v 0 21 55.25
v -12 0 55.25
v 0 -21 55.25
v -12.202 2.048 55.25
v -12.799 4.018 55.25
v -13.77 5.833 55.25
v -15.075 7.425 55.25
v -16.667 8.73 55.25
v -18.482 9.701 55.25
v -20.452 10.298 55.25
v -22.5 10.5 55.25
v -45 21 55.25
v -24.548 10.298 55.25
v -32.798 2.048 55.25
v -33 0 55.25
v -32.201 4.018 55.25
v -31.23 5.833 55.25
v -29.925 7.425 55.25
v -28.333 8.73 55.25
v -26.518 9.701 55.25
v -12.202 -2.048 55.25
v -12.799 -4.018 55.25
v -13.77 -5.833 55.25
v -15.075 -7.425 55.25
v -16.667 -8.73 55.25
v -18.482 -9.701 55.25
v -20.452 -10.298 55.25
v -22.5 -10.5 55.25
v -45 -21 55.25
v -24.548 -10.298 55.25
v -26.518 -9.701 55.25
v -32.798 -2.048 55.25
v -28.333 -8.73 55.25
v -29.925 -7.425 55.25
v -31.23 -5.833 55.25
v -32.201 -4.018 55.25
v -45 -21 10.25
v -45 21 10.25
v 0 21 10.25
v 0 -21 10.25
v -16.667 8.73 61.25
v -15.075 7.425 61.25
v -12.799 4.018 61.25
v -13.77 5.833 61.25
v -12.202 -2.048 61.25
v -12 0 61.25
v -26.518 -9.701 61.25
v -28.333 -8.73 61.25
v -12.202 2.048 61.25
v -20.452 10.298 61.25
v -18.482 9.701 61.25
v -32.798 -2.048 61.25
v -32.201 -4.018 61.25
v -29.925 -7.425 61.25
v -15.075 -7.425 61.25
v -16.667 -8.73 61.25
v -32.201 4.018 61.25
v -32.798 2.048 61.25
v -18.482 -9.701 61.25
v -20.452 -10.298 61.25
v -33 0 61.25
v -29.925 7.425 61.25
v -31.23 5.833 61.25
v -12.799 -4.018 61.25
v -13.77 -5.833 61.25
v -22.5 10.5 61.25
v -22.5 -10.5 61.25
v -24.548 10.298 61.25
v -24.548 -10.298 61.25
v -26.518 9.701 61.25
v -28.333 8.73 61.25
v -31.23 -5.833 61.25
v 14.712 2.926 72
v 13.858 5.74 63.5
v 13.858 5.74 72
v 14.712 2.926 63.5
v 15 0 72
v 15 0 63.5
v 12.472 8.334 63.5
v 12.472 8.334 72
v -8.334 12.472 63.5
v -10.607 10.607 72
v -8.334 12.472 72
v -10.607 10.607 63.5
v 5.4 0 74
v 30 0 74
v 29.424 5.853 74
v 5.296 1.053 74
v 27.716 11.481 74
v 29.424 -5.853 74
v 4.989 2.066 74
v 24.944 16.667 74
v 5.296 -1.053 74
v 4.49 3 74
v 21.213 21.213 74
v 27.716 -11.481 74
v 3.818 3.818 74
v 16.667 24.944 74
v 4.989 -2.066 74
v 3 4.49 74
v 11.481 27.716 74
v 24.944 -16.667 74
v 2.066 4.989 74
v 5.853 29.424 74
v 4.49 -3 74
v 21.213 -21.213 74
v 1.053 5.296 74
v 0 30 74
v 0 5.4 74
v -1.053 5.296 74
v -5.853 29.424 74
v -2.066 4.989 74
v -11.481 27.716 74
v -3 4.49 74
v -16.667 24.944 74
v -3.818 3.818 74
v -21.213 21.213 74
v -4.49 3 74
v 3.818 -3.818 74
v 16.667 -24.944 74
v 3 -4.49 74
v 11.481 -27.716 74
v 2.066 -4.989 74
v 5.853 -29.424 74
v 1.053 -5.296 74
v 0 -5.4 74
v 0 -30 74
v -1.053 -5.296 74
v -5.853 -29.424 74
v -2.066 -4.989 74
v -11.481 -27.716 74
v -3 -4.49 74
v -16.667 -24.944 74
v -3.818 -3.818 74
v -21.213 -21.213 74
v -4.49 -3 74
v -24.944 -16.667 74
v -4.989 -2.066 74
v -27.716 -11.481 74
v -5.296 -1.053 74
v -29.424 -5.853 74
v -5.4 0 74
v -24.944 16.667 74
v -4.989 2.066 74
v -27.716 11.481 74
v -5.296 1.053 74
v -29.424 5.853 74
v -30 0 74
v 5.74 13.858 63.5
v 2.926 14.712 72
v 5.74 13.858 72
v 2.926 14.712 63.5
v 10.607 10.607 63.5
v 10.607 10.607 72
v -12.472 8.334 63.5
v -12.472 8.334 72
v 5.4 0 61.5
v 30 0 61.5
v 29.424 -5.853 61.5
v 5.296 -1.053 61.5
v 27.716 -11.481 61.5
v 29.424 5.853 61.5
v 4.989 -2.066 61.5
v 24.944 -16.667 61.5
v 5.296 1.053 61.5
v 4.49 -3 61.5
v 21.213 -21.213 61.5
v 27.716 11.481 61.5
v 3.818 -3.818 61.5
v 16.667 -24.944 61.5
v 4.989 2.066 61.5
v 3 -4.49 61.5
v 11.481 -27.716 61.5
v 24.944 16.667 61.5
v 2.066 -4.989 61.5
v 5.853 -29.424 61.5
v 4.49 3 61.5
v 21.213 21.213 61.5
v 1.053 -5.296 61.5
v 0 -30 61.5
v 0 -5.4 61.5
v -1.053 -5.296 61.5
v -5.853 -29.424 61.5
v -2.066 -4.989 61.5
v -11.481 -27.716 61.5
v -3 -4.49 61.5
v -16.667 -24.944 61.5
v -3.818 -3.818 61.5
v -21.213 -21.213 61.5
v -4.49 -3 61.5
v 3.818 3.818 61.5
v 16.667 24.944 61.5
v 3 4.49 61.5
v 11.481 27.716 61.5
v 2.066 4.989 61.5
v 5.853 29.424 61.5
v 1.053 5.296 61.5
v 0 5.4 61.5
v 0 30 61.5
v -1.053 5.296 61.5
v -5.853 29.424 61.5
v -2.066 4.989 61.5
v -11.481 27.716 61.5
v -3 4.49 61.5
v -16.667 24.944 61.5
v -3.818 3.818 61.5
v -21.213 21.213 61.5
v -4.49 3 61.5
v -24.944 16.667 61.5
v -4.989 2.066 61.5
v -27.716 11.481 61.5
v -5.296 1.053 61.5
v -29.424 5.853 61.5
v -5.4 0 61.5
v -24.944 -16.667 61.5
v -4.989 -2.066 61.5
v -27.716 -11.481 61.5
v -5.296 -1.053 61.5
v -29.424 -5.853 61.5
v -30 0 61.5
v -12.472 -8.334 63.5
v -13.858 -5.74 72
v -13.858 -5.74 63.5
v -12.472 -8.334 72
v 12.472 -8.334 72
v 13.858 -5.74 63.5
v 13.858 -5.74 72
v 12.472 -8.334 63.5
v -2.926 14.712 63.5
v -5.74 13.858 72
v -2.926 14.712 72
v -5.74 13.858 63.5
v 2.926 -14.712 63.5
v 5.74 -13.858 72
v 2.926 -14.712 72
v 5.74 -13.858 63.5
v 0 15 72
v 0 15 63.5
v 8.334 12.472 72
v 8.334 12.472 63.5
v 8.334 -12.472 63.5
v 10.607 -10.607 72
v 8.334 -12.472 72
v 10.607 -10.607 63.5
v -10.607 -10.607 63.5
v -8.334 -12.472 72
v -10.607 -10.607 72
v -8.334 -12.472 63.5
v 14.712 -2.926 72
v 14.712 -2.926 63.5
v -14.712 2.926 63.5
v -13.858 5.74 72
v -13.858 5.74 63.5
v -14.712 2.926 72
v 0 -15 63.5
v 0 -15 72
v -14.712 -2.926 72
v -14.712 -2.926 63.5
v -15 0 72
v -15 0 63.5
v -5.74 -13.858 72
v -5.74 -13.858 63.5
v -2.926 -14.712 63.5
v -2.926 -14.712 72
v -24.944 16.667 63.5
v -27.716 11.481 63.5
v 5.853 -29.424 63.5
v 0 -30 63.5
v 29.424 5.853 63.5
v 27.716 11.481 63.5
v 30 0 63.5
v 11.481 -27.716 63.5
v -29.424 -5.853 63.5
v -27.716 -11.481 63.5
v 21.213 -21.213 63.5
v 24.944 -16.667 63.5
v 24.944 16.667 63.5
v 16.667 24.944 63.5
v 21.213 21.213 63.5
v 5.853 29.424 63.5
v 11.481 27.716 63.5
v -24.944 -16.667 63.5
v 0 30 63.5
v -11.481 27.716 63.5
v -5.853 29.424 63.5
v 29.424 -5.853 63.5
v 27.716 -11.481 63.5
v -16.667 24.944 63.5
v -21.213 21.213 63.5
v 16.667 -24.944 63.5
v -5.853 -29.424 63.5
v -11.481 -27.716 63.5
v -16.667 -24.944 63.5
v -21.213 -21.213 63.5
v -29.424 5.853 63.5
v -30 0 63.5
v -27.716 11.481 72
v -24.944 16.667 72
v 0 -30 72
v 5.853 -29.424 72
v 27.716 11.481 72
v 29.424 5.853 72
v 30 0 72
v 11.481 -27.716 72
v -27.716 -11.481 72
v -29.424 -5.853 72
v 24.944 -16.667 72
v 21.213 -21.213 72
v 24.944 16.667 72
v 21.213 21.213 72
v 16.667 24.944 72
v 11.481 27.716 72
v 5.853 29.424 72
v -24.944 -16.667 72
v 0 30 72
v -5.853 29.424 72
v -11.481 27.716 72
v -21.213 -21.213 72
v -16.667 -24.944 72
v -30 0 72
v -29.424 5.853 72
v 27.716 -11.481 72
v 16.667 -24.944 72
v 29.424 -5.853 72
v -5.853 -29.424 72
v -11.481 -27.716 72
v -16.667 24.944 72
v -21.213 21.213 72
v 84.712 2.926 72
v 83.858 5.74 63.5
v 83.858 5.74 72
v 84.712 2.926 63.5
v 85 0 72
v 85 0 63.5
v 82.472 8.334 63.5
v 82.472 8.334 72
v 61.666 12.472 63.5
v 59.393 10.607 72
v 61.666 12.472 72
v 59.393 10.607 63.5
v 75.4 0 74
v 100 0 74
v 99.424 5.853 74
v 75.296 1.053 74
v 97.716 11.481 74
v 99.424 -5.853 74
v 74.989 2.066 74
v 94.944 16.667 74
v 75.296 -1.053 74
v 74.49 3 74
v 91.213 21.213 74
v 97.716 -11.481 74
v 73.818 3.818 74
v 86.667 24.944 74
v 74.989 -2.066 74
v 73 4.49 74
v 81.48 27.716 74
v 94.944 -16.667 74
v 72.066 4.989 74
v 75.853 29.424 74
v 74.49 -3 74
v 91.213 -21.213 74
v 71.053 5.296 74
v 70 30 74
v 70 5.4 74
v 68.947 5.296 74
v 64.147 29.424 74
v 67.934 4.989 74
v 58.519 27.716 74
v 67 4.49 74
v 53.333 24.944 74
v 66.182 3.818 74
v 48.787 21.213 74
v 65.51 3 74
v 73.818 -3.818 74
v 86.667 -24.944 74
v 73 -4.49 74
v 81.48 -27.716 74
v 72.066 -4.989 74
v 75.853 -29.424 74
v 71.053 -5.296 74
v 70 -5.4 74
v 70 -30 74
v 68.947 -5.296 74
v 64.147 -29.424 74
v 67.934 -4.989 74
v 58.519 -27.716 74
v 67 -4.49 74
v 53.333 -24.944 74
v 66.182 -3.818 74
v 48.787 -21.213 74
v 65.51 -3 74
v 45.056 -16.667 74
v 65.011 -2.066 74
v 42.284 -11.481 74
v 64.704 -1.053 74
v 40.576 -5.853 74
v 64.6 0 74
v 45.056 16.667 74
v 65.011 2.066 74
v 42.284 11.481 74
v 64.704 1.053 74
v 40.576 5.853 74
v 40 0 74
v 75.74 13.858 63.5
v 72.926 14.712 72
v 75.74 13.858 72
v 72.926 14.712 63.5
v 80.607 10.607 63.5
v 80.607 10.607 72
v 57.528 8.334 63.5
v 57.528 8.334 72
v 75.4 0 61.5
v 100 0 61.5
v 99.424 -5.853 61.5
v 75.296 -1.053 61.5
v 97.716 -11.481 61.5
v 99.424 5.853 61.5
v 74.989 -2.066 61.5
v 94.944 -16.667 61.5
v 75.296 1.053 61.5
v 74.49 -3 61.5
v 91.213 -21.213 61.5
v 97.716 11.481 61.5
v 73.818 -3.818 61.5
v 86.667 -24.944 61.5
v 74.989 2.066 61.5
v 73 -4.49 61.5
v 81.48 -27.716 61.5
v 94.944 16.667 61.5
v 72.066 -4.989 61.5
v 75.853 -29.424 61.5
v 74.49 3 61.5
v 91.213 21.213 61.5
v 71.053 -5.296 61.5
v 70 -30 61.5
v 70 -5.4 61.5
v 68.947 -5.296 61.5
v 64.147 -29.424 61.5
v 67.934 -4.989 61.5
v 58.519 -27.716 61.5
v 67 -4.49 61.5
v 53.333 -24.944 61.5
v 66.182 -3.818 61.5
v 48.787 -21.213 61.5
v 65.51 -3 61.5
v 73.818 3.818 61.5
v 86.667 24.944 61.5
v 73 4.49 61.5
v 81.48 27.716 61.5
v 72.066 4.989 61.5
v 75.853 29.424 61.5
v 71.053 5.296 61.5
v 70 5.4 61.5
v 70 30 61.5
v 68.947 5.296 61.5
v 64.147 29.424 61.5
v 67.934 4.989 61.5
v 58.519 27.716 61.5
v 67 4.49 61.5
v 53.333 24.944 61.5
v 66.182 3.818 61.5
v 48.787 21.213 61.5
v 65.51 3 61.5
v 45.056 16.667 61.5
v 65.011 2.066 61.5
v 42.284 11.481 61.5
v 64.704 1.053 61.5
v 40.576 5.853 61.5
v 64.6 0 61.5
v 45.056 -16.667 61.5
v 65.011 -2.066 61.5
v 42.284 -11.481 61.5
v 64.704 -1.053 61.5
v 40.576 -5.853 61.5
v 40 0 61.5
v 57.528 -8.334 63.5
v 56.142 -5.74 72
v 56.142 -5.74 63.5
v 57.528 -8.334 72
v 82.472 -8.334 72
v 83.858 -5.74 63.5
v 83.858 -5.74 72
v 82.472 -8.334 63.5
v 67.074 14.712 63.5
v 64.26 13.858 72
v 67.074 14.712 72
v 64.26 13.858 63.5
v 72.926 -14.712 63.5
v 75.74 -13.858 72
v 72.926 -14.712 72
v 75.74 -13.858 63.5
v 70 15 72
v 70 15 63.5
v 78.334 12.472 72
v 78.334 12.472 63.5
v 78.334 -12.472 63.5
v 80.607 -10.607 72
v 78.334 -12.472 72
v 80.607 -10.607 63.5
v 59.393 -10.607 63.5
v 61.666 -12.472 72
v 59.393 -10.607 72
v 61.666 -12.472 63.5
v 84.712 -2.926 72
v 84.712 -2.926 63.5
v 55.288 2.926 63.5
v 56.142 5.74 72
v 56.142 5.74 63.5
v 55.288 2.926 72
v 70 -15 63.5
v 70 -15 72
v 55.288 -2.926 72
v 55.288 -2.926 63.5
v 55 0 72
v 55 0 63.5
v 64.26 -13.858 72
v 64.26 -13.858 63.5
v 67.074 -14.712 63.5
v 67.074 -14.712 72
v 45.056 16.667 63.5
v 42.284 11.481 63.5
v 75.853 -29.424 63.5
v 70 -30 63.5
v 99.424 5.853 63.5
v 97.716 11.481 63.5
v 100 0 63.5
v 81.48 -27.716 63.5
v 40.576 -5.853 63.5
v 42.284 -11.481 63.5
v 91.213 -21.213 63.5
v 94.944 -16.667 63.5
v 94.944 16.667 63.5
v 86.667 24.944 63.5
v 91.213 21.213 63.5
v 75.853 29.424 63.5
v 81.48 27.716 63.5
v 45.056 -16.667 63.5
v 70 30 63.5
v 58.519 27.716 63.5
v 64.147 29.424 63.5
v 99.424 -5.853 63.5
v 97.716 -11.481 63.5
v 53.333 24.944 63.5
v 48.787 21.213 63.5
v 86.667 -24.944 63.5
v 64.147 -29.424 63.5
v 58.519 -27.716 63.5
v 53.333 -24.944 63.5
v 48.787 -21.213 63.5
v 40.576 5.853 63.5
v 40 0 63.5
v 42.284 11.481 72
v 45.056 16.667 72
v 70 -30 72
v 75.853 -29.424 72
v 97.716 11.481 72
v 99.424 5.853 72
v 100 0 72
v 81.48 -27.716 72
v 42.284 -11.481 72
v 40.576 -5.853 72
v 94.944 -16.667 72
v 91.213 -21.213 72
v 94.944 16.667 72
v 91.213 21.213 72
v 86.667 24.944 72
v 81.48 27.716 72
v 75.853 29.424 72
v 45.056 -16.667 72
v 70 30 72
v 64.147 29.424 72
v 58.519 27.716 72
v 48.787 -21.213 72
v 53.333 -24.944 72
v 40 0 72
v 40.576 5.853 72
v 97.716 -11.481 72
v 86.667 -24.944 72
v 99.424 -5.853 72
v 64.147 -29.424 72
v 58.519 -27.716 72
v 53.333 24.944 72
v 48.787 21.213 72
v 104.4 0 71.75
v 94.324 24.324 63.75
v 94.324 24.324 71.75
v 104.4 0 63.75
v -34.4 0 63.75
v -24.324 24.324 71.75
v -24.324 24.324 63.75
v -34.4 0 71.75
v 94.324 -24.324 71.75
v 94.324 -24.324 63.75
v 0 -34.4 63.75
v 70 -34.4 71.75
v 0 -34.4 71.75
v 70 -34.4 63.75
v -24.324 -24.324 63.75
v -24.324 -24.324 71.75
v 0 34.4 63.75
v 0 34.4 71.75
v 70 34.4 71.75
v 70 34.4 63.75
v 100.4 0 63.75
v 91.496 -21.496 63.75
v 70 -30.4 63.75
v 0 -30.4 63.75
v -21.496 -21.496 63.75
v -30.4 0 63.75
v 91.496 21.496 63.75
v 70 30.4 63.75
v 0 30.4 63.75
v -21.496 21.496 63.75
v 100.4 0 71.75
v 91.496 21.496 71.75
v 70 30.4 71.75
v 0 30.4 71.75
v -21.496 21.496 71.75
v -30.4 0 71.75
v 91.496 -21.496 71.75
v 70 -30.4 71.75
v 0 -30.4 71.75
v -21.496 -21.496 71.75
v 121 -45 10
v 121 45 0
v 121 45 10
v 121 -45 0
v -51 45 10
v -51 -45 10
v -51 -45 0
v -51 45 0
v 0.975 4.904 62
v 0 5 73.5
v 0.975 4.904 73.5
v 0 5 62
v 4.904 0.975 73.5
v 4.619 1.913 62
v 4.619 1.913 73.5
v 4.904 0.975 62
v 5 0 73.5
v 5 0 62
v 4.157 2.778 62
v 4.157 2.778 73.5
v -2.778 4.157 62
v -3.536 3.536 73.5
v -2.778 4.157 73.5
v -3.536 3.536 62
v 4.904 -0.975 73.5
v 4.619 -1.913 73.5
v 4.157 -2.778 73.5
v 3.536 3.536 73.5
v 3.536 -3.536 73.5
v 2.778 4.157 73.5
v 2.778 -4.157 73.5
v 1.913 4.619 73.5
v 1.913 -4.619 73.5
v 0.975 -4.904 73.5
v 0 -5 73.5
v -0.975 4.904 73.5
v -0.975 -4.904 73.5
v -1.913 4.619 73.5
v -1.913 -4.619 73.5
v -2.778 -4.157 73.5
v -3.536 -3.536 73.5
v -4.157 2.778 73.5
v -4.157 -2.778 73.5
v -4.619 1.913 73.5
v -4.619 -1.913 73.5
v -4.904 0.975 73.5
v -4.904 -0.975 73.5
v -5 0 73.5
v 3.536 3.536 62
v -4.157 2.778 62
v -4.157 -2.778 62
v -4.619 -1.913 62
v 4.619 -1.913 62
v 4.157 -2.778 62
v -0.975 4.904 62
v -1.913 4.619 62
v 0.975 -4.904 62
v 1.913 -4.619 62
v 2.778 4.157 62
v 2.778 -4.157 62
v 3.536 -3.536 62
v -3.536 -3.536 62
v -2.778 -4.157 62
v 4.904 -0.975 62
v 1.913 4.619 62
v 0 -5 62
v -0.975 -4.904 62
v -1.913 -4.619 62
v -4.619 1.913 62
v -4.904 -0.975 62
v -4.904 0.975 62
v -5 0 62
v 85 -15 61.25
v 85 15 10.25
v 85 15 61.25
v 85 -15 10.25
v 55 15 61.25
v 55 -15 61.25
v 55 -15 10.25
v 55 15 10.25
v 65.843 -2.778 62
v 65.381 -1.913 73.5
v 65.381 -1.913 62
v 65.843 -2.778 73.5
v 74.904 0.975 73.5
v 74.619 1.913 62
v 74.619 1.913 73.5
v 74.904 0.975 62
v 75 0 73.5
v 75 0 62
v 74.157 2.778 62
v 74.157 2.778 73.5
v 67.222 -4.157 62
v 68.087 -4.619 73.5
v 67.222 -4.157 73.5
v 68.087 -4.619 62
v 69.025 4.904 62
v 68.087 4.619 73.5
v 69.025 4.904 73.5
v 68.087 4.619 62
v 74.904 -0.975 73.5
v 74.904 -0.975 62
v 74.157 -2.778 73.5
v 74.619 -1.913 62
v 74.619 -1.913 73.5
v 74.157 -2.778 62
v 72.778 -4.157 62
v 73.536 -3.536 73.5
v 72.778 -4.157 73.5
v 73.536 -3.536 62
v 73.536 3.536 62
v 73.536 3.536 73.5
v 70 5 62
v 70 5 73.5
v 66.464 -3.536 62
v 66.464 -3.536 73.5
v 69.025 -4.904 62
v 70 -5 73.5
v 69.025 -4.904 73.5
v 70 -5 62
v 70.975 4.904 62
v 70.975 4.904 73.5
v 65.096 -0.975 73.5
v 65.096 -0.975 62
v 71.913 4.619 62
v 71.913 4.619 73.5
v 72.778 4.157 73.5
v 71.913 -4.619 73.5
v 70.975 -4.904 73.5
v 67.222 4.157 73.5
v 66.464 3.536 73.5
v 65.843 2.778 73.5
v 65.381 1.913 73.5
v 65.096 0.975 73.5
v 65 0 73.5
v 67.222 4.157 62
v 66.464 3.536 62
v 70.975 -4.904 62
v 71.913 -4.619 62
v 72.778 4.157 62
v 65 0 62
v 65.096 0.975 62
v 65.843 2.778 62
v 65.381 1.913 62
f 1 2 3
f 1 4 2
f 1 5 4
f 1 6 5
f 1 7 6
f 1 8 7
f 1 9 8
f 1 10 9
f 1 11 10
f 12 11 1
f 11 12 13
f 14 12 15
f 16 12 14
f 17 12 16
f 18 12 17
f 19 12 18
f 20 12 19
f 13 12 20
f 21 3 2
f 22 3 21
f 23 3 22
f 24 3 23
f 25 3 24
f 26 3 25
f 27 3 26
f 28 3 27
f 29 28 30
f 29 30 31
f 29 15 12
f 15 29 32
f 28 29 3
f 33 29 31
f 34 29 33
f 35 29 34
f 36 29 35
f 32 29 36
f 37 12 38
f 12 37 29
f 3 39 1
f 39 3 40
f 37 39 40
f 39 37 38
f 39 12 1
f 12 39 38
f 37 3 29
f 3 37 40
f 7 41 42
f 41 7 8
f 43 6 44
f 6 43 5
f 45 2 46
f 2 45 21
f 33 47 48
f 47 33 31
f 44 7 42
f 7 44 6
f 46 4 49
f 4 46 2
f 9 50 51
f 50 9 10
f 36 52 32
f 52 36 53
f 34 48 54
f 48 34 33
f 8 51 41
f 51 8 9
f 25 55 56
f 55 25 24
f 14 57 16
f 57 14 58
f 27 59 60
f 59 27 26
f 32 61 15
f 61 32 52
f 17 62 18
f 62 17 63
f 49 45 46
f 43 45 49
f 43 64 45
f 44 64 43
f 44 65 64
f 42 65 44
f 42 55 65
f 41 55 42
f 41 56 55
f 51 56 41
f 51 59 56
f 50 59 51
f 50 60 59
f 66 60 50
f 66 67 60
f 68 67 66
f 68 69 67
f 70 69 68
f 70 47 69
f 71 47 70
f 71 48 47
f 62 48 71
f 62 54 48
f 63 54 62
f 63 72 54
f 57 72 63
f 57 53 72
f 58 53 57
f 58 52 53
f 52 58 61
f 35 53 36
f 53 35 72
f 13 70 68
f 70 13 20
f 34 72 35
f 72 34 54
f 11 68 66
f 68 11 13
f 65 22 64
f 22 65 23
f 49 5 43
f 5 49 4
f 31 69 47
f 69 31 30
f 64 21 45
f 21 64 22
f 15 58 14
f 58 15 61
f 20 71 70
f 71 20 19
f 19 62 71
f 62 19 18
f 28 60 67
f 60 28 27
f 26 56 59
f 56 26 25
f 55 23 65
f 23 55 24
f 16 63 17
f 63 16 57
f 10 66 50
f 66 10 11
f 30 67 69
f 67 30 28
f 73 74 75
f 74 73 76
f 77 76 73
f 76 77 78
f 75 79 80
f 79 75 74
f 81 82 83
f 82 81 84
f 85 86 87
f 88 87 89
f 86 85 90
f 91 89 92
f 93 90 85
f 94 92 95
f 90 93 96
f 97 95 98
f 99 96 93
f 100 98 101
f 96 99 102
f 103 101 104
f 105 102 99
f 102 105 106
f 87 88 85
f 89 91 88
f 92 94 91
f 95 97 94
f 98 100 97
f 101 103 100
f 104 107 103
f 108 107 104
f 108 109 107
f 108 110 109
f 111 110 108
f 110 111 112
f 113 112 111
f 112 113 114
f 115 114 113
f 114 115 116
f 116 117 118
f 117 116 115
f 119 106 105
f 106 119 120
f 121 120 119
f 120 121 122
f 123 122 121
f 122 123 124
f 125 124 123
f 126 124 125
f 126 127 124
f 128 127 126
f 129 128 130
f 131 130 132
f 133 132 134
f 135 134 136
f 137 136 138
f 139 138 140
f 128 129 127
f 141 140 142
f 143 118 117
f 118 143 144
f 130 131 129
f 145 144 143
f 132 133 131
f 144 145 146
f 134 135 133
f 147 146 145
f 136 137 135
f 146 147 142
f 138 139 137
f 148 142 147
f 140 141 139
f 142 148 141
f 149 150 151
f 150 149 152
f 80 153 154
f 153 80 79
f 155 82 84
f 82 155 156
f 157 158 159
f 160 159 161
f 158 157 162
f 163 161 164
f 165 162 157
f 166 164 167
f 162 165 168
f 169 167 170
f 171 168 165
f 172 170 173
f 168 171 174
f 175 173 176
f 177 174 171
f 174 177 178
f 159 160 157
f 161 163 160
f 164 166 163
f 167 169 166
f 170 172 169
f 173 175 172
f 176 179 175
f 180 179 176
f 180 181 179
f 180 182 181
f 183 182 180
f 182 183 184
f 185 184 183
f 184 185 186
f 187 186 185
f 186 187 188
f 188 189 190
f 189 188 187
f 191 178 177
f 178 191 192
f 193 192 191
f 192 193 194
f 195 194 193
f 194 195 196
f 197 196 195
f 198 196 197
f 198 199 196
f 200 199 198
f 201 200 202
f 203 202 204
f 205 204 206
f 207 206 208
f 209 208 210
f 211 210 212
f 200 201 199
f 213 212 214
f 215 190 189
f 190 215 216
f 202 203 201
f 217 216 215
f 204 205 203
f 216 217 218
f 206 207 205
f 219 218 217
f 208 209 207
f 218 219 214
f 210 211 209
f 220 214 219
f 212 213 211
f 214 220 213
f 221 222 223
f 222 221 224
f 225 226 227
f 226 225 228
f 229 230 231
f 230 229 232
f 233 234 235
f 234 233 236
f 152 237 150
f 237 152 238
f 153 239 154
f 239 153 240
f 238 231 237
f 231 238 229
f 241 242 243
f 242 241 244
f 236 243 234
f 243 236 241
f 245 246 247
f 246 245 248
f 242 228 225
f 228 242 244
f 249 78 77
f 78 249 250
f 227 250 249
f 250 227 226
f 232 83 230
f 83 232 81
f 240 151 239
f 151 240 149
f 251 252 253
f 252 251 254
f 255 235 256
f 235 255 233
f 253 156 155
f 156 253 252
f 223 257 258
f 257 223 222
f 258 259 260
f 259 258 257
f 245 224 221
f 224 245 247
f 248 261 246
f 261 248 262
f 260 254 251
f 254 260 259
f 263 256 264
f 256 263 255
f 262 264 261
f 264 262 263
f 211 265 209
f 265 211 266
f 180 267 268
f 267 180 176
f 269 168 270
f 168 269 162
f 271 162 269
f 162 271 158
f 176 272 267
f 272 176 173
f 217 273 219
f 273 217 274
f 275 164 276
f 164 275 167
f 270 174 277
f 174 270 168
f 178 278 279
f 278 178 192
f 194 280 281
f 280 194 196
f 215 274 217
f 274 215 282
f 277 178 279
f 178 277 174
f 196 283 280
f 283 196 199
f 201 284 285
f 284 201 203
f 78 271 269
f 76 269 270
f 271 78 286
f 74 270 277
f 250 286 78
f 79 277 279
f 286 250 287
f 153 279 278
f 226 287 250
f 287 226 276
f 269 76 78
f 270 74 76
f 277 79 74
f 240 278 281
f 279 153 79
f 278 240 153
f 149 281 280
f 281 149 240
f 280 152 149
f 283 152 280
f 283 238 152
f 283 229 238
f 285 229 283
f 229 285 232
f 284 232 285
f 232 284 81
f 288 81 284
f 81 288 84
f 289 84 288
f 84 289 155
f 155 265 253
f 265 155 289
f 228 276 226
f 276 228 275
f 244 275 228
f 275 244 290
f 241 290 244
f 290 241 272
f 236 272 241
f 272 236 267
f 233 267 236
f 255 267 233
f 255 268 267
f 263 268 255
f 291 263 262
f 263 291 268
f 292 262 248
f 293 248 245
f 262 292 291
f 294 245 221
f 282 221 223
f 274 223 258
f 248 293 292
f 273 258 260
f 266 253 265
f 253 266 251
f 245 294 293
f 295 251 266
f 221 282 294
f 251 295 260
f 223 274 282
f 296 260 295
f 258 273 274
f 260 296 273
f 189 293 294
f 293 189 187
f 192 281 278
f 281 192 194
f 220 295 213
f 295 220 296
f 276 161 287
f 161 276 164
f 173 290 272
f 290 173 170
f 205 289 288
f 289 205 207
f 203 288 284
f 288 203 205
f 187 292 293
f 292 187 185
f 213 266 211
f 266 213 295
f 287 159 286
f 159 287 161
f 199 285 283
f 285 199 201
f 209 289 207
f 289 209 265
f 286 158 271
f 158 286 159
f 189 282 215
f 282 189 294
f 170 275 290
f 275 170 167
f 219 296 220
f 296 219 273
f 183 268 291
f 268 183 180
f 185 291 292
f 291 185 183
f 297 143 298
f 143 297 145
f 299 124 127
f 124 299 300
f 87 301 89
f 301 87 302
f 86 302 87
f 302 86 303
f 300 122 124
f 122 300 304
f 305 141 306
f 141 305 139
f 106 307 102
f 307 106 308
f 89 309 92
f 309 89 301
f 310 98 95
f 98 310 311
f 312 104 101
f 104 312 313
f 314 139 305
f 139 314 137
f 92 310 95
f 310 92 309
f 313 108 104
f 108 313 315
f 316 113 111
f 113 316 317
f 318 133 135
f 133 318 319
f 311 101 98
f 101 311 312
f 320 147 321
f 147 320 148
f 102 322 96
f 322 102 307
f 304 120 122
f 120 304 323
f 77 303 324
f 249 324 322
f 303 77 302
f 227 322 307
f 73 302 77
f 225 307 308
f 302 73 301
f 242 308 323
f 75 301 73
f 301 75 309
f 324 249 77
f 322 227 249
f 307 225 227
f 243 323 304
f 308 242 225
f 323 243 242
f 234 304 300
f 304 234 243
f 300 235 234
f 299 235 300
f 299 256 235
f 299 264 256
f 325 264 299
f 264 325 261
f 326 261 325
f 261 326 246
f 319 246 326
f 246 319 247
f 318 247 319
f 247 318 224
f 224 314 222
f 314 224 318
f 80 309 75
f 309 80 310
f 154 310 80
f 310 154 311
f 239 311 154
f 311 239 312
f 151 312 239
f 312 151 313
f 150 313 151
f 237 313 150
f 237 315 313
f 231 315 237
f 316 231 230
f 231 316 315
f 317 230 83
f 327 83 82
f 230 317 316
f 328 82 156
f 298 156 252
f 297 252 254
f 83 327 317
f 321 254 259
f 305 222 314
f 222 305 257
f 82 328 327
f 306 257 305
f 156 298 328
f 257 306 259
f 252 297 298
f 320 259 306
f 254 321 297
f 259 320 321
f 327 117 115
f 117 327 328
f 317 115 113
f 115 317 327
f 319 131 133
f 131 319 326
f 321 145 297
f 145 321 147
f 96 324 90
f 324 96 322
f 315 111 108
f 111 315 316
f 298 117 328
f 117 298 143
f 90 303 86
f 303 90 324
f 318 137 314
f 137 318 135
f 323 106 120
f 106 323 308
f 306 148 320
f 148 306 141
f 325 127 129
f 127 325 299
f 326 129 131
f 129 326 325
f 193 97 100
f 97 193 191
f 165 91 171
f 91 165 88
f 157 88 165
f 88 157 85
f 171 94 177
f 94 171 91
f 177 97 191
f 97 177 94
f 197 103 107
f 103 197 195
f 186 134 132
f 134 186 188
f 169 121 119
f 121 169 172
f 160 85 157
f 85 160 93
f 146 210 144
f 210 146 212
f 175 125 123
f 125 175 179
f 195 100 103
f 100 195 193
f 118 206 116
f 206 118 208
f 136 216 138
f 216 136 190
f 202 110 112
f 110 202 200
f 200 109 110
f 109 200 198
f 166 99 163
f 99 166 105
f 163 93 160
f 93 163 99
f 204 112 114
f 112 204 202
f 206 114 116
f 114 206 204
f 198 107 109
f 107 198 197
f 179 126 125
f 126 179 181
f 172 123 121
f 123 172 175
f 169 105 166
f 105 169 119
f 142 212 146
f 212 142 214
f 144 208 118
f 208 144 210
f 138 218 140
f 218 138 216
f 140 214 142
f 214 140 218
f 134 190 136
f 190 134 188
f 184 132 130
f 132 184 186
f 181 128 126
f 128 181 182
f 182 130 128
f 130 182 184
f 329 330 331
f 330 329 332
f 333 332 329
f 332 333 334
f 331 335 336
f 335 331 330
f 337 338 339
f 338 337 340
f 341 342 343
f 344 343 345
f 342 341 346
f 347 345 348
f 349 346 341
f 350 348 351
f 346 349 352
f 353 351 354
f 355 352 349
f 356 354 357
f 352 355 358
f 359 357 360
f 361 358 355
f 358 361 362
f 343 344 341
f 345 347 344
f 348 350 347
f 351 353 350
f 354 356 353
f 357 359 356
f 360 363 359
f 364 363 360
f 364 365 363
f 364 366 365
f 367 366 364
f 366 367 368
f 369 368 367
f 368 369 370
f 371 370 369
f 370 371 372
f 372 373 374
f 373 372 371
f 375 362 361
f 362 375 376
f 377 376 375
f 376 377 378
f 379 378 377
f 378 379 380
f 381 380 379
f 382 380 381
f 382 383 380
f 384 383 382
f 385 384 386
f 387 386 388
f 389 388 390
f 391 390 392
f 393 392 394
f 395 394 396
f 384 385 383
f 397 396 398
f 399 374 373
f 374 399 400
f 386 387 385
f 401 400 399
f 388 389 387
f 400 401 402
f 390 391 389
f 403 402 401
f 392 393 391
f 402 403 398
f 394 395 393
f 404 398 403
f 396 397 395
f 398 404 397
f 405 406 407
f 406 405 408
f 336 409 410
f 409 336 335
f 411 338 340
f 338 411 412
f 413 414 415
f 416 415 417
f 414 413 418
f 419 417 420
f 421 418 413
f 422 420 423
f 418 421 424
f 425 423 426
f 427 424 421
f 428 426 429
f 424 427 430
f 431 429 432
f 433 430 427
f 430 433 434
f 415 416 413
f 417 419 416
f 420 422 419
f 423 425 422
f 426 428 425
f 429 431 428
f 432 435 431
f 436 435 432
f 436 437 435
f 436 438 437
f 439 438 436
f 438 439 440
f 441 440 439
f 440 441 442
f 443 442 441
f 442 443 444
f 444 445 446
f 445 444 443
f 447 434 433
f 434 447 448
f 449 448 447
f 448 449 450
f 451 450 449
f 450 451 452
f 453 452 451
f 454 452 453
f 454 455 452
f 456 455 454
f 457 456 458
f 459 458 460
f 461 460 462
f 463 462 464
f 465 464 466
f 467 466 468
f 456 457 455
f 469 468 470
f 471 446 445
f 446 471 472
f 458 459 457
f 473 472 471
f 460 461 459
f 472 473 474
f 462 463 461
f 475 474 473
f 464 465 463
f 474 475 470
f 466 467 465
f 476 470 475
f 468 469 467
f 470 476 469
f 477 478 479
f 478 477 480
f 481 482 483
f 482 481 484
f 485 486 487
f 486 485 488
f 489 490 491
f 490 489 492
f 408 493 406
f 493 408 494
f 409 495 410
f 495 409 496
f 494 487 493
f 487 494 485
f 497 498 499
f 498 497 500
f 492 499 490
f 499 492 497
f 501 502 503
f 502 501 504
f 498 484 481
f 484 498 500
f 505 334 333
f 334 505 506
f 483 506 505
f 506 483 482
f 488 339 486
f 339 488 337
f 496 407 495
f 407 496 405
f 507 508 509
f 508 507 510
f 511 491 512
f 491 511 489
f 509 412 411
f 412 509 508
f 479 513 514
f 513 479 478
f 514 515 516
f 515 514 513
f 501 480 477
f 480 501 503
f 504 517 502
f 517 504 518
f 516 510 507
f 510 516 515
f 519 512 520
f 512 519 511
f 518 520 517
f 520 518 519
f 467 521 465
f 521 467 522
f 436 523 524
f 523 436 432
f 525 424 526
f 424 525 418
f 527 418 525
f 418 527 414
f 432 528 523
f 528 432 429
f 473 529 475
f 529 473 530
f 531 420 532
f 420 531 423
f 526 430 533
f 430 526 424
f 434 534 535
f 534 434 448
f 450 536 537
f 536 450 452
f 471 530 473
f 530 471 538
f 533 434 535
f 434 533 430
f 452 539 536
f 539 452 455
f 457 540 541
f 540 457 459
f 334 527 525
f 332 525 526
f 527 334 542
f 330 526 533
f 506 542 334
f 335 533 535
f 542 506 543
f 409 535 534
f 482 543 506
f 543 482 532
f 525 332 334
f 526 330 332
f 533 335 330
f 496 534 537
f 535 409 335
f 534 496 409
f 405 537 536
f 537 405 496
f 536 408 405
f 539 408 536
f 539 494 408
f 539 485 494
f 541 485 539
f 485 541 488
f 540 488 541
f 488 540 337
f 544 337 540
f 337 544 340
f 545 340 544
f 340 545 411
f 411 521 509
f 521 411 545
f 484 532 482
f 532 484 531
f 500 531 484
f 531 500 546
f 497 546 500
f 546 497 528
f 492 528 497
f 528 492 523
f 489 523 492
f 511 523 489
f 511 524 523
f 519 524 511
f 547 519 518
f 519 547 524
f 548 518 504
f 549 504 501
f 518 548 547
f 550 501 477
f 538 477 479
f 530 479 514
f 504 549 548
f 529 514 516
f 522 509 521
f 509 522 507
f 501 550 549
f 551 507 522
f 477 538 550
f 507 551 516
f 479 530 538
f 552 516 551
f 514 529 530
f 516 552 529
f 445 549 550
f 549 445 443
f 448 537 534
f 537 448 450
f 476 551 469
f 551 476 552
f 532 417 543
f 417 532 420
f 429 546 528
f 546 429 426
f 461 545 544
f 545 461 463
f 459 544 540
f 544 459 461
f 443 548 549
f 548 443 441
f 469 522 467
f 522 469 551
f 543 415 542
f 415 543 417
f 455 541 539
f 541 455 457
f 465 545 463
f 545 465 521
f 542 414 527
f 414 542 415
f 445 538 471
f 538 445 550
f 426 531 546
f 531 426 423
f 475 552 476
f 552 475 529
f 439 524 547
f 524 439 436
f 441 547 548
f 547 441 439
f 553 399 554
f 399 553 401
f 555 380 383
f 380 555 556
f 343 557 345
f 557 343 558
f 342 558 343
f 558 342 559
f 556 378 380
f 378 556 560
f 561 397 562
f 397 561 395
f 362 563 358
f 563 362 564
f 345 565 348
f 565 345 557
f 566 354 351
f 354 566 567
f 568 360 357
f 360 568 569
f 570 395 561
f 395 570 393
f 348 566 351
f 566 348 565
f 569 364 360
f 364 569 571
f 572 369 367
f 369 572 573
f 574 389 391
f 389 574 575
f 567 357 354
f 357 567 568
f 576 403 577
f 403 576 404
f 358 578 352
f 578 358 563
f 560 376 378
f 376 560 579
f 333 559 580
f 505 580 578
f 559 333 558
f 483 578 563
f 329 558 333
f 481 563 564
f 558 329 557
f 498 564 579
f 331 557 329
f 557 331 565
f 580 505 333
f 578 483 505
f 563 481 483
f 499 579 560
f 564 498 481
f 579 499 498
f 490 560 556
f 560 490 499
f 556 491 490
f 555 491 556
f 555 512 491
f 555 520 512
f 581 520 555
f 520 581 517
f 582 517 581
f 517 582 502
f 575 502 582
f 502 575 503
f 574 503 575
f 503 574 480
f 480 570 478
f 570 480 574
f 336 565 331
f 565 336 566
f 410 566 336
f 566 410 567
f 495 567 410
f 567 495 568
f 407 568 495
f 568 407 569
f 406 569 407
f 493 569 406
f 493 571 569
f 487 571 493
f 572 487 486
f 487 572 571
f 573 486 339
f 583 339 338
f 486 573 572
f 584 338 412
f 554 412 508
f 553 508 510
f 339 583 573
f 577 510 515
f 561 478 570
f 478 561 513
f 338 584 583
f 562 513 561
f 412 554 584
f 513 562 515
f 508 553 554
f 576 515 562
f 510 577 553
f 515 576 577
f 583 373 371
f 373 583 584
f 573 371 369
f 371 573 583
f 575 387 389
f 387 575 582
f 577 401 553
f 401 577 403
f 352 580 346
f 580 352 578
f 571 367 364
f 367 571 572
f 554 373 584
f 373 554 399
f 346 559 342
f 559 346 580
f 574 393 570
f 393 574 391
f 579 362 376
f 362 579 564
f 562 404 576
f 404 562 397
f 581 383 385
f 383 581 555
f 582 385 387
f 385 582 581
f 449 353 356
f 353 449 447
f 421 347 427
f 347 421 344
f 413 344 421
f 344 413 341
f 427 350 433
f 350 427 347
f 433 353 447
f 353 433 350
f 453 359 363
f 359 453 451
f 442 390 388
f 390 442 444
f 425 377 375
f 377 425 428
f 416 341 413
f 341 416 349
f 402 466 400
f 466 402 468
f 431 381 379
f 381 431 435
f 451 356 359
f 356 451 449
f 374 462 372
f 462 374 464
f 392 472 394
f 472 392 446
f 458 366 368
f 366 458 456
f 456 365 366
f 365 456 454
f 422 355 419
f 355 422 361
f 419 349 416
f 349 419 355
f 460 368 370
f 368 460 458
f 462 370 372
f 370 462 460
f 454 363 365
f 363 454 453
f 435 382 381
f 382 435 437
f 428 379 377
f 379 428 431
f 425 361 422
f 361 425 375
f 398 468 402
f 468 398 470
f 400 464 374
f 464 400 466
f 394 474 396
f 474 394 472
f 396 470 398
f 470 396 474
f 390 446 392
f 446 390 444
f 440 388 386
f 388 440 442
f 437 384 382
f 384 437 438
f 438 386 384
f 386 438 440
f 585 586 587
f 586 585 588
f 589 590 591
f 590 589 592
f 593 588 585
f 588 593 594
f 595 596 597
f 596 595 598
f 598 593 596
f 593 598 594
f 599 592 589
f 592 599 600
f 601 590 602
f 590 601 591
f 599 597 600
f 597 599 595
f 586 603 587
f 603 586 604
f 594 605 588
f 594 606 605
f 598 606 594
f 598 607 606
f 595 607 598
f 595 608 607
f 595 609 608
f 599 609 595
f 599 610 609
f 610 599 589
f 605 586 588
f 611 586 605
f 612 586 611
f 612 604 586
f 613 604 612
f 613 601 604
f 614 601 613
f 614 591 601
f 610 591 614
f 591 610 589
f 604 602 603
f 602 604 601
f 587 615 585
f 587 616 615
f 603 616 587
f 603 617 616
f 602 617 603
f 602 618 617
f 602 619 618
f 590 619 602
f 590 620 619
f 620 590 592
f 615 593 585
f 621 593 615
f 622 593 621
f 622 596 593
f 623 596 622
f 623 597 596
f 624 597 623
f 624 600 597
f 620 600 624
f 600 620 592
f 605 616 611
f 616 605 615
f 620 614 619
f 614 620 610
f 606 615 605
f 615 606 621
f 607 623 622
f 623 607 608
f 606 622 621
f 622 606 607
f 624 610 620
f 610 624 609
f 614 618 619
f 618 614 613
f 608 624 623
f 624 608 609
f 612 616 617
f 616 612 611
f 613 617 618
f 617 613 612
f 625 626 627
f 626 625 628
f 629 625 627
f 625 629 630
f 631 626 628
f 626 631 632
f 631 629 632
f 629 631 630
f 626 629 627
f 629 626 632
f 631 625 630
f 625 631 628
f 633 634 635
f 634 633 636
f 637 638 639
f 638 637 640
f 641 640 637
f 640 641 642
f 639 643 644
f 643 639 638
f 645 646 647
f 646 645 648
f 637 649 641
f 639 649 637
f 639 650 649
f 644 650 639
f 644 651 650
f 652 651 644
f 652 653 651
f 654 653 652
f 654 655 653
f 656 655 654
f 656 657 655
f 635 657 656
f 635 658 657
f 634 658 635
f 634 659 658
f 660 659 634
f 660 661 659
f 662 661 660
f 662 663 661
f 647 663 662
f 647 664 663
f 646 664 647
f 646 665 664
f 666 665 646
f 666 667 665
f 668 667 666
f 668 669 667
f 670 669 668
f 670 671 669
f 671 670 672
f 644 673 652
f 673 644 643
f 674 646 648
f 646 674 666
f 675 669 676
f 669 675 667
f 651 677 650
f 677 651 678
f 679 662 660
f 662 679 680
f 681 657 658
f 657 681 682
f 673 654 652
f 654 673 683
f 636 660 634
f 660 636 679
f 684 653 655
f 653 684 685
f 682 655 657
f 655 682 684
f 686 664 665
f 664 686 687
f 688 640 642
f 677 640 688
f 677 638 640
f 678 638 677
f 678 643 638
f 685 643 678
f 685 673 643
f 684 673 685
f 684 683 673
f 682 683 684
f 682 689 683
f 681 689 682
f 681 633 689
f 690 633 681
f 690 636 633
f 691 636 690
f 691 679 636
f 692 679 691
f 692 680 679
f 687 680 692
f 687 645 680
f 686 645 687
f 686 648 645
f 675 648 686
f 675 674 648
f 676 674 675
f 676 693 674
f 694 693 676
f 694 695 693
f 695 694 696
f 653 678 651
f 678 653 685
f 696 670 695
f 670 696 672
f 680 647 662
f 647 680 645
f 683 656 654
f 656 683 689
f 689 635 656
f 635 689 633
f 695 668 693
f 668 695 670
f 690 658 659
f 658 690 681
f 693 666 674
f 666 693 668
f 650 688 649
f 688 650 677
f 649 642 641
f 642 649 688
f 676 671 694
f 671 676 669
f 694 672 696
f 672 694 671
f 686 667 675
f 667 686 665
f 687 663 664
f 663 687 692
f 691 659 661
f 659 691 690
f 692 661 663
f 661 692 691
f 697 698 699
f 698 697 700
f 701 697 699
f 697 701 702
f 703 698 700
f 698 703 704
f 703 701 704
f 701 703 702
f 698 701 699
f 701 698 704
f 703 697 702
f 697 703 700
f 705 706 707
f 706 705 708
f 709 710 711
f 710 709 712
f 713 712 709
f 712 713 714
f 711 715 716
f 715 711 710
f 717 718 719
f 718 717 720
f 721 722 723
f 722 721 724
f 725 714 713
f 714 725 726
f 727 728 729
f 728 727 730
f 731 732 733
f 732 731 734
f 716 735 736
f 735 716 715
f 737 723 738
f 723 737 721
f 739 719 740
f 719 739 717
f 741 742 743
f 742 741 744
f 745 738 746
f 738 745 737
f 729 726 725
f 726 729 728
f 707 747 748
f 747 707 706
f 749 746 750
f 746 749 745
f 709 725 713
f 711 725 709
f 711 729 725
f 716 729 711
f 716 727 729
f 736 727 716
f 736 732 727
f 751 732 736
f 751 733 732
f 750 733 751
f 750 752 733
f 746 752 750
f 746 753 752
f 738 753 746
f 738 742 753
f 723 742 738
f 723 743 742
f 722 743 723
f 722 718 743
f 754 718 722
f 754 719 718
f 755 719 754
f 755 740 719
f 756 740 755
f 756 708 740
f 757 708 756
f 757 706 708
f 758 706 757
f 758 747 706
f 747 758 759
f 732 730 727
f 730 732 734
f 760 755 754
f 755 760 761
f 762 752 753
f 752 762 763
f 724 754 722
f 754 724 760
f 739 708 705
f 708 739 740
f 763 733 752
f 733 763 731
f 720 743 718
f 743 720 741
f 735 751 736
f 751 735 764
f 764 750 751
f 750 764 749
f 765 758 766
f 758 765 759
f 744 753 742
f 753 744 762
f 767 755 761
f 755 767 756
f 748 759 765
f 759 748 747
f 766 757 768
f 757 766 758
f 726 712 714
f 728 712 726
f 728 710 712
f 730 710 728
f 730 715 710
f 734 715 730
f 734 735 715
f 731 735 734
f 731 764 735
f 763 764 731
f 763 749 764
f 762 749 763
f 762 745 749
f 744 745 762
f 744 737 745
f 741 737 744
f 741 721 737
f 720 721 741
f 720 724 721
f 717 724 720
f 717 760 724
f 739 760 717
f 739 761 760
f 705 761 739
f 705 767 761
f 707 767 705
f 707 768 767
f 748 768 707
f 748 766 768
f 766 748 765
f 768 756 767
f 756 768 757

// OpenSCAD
$fn = 32;

// ------------------------------------------------------------------------
// Motor belt drive: span 70 mm, pulleys d60, belt 8 mm wide
// Every part is its own module, assembly() places every instance.
// ------------------------------------------------------------------------

// --- part 1 ---
module base_plate() {
  difference() {
    translate([-86, -45, 0]) cube([172, 90, 10]);
  }
}

// --- part 2 ---
module motor() {
  union() {
    translate([-22.5, -21, 0]) cube([45, 42, 45]);
    translate([25.5, 0, 22.5]) rotate([0, 90, 0]) cylinder(h = 6, d = 21, center = true);
  }
}

// --- part 3 ---
module drive_shaft() {
  translate([0, 0, -5.75]) cylinder(h = 11.5, d = 10);
}

// --- part 4 ---
module pulley_drive() {
  difference() {
    union() {
      cylinder(h = 12.5, d = 30);
      cylinder(h = 2, d = 60);
      translate([0, 0, 10.5]) cylinder(h = 2, d = 60);
    }
    translate([0, 0, -1]) cylinder(h = 14.5, d = 10.8);
  }
}

// --- part 5 ---
module idler_post() {
  translate([-15, -15, 0]) cube([30, 30, 51]);
}

// --- part 6 ---
module driven_shaft() {
  translate([0, 0, -5.75]) cylinder(h = 11.5, d = 10);
}

// --- part 7 ---
module pulley_driven() {
  difference() {
    union() {
      cylinder(h = 12.5, d = 30);
      cylinder(h = 2, d = 60);
      translate([0, 0, 10.5]) cylinder(h = 2, d = 60);
    }
    translate([0, 0, -1]) cylinder(h = 14.5, d = 10.8);
  }
}

// --- part 8 ---
module drive_belt() {
  difference() {
    linear_extrude(height = 8) polygon(points = concat([for (a = [90 : 45 : 270]) [34.4 * cos(a), 34.4 * sin(a)]], [for (a = [270 : 45 : 450]) [70 + 34.4 * cos(a), 34.4 * sin(a)]]));
    translate([0, 0, -1]) linear_extrude(height = 10) polygon(points = concat([for (a = [90 : 45 : 270]) [30.4 * cos(a), 30.4 * sin(a)]], [for (a = [270 : 45 : 450]) [70 + 30.4 * cos(a), 30.4 * sin(a)]]));
  }
}

// --- assembly ---
module assembly() {
  color([0.80, 0.24, 0.20]) translate([35, 0, 0]) rotate([0, 0, 0]) base_plate();
  color([0.20, 0.45, 0.75]) translate([0, 0, 32.75]) rotate([0, 270, 0]) motor();
  color([0.25, 0.62, 0.32]) translate([0, 0, 67.75]) rotate([0, 0, 0]) drive_shaft();
  color([0.92, 0.70, 0.18]) translate([0, 0, 61.5]) rotate([0, 0, 0]) pulley_drive();
  color([0.58, 0.35, 0.70]) translate([70, 0, 10.25]) rotate([0, 0, 0]) idler_post();
  color([0.16, 0.66, 0.66]) translate([70, 0, 67.75]) rotate([0, 0, 0]) driven_shaft();
  color([0.85, 0.48, 0.18]) translate([70, 0, 61.5]) rotate([0, 0, 0]) pulley_driven();
  color([0.55, 0.60, 0.65]) translate([0, 0, 63.75]) rotate([0, 0, 0]) drive_belt();
}

assembly();
